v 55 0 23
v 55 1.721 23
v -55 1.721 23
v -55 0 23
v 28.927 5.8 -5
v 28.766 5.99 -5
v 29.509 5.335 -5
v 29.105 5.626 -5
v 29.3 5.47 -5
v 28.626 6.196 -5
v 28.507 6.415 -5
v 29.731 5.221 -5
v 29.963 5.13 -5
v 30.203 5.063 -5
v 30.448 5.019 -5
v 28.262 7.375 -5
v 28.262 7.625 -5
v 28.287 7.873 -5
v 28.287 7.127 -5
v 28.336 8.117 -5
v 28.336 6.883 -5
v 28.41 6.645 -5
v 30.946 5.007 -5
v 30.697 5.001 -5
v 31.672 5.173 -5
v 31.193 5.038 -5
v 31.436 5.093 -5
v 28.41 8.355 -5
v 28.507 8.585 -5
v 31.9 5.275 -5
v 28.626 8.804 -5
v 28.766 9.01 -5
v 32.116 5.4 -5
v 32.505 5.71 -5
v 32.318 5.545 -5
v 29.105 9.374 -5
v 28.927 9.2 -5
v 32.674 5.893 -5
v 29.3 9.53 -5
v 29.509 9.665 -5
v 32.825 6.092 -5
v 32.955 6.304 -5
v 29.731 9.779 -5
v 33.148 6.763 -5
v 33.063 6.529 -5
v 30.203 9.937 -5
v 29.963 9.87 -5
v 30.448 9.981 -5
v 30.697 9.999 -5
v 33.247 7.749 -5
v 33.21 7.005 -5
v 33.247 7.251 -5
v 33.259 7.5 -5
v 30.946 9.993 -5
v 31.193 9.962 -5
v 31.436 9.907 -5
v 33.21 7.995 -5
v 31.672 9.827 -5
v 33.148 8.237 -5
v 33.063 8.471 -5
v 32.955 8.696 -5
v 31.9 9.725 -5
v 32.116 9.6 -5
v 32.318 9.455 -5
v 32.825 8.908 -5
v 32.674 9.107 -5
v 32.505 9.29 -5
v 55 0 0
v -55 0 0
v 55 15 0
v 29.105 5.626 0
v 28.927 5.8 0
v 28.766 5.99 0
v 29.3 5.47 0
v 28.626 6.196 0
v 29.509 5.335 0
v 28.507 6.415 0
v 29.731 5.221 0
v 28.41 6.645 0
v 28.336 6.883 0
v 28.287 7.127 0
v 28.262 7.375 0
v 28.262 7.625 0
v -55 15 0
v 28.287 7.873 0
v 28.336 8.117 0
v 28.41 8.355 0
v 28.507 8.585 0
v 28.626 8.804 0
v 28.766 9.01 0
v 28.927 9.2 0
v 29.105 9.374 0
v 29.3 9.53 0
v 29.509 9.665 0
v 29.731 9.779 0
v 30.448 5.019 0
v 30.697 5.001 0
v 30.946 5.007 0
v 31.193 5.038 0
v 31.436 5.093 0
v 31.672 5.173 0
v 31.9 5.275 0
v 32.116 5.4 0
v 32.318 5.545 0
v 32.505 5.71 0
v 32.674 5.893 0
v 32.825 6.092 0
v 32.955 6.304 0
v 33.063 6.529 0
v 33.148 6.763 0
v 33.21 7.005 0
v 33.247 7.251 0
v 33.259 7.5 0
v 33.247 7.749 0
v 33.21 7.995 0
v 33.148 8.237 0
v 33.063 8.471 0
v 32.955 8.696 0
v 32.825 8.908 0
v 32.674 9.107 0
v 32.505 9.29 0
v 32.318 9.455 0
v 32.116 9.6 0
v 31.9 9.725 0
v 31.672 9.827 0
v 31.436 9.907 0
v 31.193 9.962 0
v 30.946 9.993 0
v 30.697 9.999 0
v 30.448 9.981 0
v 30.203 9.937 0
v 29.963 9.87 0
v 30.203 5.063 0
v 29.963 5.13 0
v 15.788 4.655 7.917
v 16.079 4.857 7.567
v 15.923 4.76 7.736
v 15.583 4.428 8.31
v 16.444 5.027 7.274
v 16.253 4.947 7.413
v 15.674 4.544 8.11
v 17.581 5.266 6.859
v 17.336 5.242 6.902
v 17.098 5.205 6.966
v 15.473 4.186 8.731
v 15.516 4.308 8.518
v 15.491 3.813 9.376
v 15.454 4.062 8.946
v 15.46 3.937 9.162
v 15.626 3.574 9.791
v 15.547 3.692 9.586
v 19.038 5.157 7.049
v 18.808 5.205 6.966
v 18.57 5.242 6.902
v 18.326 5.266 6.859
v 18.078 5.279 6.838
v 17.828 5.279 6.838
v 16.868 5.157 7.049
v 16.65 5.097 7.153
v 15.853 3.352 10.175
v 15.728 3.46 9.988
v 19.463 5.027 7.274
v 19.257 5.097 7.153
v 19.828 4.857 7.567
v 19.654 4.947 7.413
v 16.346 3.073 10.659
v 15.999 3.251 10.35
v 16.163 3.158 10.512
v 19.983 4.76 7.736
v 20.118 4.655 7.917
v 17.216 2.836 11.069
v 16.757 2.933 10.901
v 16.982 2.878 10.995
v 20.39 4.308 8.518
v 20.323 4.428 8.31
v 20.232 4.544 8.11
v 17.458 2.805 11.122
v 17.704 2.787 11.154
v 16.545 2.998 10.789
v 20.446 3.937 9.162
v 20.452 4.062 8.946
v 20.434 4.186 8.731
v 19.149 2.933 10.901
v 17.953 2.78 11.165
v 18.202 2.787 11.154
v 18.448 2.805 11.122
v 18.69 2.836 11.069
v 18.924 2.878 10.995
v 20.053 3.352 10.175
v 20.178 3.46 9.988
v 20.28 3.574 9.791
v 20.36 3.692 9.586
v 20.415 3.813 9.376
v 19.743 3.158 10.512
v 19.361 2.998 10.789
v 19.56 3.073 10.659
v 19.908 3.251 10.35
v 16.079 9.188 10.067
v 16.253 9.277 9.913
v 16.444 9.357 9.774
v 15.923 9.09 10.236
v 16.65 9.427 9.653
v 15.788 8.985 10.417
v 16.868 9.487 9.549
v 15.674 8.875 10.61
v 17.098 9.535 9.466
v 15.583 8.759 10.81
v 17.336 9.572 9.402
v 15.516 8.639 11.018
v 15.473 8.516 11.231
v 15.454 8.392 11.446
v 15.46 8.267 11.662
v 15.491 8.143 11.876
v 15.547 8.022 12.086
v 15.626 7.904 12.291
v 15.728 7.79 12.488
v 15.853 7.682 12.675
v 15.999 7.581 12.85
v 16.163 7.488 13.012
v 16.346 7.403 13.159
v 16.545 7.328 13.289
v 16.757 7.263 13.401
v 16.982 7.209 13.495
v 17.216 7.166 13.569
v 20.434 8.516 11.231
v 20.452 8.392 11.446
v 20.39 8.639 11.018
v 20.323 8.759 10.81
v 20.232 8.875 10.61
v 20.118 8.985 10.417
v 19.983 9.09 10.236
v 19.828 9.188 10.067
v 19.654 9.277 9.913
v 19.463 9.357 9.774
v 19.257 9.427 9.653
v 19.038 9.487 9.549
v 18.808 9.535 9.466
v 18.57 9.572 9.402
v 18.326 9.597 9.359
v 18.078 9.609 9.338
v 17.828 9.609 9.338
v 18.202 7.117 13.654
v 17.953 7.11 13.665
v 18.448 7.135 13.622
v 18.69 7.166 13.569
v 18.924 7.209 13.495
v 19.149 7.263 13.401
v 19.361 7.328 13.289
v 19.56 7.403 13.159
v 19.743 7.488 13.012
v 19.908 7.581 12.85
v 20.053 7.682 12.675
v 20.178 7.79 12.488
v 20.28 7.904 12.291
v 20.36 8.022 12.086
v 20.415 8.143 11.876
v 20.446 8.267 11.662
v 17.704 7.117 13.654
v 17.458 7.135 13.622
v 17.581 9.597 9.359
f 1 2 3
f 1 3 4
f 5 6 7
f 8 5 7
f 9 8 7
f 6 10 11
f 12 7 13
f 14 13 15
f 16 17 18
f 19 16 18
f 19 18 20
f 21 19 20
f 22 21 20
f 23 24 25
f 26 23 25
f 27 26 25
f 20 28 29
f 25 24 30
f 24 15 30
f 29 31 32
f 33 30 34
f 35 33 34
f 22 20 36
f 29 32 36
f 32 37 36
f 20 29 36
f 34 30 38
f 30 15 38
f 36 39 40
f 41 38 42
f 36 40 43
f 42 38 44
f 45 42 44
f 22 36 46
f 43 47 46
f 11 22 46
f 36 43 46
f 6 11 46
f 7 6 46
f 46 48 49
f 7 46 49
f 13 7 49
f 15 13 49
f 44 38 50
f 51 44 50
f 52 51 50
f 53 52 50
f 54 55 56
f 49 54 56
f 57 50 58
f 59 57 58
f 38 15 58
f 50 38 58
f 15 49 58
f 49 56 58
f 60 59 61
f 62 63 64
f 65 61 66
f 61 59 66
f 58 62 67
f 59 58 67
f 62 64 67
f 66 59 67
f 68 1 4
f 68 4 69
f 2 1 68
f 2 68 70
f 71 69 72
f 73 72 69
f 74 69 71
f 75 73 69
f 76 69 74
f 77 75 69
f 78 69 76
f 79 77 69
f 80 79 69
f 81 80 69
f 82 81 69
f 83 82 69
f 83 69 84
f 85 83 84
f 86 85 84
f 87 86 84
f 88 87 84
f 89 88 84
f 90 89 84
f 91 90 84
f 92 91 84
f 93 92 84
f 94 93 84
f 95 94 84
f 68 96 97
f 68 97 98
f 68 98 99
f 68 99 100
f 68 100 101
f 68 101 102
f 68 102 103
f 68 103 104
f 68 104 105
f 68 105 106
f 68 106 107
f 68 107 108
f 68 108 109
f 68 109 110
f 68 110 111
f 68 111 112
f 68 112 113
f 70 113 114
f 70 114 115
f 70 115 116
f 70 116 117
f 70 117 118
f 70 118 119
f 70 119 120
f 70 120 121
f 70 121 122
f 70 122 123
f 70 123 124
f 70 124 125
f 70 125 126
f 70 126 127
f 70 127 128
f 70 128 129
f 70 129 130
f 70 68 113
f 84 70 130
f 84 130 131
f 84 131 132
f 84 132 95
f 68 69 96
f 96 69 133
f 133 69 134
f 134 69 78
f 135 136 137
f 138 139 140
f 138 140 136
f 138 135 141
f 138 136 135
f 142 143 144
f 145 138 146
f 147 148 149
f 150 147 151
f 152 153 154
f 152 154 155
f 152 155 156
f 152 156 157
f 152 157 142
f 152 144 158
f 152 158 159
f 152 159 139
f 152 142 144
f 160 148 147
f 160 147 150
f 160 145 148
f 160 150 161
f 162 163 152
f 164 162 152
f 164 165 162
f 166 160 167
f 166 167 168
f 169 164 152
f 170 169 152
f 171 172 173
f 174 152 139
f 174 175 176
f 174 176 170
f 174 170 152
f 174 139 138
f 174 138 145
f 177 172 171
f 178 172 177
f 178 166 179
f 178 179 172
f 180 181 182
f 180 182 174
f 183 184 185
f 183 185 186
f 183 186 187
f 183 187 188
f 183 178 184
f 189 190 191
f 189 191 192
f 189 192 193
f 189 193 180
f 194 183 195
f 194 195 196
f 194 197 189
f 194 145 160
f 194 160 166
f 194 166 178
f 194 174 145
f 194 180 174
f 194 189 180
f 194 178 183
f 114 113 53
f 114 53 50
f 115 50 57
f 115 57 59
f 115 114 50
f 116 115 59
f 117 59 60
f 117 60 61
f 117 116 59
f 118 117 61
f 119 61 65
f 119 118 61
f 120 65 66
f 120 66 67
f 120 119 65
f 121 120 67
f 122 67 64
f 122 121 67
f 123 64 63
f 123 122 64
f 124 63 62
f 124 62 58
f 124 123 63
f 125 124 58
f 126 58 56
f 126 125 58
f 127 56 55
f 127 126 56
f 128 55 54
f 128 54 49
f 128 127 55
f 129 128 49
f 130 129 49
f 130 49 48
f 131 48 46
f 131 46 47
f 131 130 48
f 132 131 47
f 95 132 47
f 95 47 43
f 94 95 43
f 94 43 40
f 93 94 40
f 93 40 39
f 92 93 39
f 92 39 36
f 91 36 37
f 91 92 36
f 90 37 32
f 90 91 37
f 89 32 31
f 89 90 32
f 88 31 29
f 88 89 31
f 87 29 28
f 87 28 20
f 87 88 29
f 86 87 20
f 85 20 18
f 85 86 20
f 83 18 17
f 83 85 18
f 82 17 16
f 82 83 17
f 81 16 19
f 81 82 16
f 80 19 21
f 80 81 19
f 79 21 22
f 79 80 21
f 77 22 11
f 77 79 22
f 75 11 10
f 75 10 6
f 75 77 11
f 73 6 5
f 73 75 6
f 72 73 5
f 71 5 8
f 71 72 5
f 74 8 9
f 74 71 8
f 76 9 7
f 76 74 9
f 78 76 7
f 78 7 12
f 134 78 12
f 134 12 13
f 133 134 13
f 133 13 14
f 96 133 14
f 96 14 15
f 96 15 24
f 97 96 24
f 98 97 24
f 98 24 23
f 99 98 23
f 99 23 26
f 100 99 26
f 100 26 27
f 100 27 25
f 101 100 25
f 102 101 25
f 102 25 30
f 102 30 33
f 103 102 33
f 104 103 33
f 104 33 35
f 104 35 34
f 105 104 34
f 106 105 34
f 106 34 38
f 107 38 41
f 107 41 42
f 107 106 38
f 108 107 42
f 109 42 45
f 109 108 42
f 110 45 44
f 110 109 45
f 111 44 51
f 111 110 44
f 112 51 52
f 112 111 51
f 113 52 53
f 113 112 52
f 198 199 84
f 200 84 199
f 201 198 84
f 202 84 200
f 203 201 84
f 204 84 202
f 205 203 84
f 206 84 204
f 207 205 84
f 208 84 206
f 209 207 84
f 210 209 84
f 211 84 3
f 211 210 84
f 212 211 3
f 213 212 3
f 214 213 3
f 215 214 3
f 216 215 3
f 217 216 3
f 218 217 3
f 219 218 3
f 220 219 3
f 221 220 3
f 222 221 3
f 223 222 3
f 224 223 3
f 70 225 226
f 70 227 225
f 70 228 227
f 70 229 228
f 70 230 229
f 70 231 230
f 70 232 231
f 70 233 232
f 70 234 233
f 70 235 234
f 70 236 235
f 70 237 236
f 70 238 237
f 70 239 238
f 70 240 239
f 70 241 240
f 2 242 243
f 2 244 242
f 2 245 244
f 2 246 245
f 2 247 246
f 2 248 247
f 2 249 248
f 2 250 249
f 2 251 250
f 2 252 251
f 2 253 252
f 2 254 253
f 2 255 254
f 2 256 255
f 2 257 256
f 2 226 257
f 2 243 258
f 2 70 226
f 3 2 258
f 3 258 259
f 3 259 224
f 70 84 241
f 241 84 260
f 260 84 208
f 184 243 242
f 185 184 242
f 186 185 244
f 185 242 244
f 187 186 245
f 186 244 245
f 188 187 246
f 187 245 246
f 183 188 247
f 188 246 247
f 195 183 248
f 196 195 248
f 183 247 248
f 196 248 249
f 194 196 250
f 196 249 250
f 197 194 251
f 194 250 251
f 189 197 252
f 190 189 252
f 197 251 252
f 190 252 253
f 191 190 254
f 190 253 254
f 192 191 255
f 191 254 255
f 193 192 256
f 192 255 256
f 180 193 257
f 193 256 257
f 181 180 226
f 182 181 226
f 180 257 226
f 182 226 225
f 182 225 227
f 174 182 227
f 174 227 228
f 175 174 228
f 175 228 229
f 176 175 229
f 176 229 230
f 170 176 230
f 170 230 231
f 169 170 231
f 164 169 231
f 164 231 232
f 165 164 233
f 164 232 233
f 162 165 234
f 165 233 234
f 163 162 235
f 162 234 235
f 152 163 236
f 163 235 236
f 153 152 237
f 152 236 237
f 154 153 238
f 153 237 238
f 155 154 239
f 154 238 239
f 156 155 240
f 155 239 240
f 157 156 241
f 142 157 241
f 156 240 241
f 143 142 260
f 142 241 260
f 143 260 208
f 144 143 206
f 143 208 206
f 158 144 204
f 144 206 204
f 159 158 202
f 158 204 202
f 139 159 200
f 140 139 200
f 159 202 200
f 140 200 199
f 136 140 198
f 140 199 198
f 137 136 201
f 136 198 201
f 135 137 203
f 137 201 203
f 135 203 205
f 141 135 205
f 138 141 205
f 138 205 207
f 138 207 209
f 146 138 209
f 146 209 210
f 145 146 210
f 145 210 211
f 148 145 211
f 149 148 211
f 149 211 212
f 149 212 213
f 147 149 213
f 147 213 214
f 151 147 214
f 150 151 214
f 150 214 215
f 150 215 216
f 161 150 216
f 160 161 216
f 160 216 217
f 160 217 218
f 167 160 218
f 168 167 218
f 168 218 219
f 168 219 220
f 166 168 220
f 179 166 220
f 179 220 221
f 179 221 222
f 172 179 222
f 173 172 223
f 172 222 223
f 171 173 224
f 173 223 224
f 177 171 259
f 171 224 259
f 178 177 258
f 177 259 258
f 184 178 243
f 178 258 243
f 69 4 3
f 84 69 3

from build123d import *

# Parameters (mm, degrees)
PAD_DEPTH    = 55
SKETCH001_R  = 2.5
PAD001_DEPTH = 5
SKETCH002_R  = 2.5
POCKET_DEPTH = 5


with BuildPart() as part:
    # Sketch → Pad (new body, symmetric)
    with BuildSketch(Plane.YZ):
        Polygon((0, 0), (-13.2790561914, 23), (-15, 23), (-15, 0), align=None)
    extrude(amount=PAD_DEPTH, both=True)

    # Sketch001 → Pad001 (join)
    with BuildSketch(Plane.XY):
        with Locations((30.7591449816, -7.5)):
            Circle(SKETCH001_R)
    extrude(amount=-PAD001_DEPTH)

    # Sketch002 (on Face1 of Pad001) → Pocket (cut)
    with BuildSketch(Plane(origin=(0, 0, 0), x_dir=(0, -0.5, 0.8660254038), z_dir=(0, 0.8660254038, 0.5))):
        with Locations((13.2790561914, 17.9531074876)):
            Circle(SKETCH002_R)
    extrude(amount=-POCKET_DEPTH, mode=Mode.SUBTRACT)


with BuildPart() as part_1:
    # Body placement: moved
    add(part.part.moved(Location((0, 15, 0))))


solid = part_1.part
